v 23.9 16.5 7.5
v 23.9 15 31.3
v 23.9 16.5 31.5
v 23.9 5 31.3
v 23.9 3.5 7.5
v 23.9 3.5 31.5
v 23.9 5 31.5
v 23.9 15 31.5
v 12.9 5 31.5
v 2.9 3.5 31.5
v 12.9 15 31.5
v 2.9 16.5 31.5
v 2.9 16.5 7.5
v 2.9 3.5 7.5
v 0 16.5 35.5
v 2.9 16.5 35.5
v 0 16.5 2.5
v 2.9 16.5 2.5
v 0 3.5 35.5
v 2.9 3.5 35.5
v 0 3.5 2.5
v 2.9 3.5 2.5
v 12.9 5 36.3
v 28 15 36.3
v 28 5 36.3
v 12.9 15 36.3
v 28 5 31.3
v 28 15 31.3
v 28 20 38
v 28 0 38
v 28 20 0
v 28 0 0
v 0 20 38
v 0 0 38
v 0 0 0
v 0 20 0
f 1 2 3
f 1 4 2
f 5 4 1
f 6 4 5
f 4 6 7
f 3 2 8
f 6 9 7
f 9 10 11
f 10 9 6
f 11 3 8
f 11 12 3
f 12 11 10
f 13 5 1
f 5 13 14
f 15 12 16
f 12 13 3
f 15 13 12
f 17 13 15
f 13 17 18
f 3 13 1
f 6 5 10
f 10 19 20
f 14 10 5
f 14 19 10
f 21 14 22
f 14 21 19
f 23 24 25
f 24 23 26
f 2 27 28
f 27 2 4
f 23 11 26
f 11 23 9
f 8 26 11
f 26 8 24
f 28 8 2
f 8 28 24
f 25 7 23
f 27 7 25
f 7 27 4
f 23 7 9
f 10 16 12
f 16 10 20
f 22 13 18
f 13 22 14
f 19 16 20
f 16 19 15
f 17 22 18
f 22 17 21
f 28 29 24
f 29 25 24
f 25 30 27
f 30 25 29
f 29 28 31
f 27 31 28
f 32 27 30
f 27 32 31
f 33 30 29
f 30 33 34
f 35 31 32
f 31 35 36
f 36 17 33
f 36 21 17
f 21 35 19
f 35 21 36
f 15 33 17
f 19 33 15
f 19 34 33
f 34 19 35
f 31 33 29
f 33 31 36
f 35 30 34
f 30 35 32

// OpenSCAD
//---------------------------------------------------------------------------------------------
//-- Printable servo tea bot
//-- (c) Martin Korinek	m.ko@inode.at
//-- April-2015
//---------------------------------------------------------------------------------------------
//--
//---------------------------------------------------------------------------------------------

//fragment minimum angle
  $fa=10.0;

//fragment minimum size
  $fs=0.2;
  
  heigth =30;

	difference()
	{  
		cube([28,20,38]);
		translate([-0.1,3.5,7.5])
		{
			//size of micro servo
			#cube([24,13,24]);
			translate([13,1.5,23.8])
				#cube([30,10,5]);
			translate([0,0,-5])
				#cube([3,13,33]);
		}
	}
